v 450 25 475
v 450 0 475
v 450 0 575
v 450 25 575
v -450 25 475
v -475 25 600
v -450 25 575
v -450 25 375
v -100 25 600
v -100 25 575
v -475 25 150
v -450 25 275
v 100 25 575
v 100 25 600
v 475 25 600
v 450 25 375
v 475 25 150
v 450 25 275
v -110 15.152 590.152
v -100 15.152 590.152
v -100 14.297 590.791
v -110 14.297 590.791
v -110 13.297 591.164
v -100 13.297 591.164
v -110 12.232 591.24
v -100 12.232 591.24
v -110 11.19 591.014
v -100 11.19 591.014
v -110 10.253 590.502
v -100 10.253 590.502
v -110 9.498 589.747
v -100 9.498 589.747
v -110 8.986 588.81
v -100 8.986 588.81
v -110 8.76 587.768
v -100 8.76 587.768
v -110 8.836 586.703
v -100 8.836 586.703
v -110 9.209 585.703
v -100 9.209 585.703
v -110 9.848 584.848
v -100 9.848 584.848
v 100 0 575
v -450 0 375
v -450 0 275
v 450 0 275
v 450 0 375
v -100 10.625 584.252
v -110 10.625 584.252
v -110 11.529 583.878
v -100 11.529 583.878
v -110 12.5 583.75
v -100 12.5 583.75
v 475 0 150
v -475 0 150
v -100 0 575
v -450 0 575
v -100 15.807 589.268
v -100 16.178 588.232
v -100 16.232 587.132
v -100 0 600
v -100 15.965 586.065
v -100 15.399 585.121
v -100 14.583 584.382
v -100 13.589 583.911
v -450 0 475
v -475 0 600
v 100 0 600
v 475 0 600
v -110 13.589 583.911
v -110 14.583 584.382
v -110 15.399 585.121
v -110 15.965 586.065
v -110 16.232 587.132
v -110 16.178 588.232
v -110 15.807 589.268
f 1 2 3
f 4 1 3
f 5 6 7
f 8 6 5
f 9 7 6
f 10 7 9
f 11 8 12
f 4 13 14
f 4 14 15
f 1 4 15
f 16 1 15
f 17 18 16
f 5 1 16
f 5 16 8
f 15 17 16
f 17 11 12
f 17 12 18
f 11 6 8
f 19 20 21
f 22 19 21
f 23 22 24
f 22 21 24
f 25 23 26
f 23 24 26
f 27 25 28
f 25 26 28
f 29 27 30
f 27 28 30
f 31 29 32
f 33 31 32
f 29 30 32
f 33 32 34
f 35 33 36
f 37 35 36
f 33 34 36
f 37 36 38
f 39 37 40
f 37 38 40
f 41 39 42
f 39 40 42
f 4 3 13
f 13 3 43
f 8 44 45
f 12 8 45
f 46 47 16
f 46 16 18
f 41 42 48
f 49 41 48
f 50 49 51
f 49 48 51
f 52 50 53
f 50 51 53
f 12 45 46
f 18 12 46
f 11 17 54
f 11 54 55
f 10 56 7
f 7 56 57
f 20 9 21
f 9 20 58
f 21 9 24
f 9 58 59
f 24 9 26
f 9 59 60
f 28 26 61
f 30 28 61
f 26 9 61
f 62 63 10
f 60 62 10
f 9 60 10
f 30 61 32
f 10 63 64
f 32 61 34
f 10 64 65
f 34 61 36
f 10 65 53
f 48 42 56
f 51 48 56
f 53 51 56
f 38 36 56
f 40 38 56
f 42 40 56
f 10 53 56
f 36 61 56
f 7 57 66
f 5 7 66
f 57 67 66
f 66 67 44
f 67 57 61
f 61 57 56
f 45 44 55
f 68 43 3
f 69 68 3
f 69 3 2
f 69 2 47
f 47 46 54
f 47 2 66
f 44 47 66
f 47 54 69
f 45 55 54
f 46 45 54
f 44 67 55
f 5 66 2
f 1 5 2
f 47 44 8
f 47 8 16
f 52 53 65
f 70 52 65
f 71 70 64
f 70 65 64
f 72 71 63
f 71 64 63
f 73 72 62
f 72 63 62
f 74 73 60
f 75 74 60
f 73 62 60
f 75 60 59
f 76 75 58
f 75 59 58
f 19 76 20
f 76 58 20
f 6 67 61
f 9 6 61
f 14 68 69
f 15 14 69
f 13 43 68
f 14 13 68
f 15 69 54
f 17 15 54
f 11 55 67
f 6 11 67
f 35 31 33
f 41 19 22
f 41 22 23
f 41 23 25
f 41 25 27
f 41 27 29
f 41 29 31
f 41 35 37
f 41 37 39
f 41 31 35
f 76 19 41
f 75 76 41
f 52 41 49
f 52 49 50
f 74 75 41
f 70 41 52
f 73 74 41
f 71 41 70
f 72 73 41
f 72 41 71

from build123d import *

# Parameters (mm, degrees)
CROQUIS1_W              = 900
CROQUIS1_H              = 100
CROQUIS1_H_2            = 150
SALIENTE_EXTRUIR2_DEPTH = 25
CORTAR_EXTRUIR1_DEPTH   = 10
CROQUIS3_W              = 950
CROQUIS3_H              = 25
CORTAR_EXTRUIR2_DEPTH   = 750


with BuildPart() as part:
    # Croquis1 → Saliente-Extruir2 (new body)
    with BuildSketch(Plane(origin=(0, 0, 0), x_dir=(1, 0, 0), z_dir=(0, 1, 0))):
        Polygon((450, -475), (450, -575), (100, -575), (100, -600), (475, -600), (475, 600), (-475, 600), (-475, -600), (-100, -600), (-100, -575), (-450, -575), (-450, -475), align=None)
        with Locations((0, -325)):
            Rectangle(CROQUIS1_W, CROQUIS1_H, mode=Mode.SUBTRACT)
        with Locations((0, 50)):
            Rectangle(CROQUIS1_W, CROQUIS1_H_2, mode=Mode.SUBTRACT)
        with Locations((0, 350)):
            Rectangle(CROQUIS1_W, CROQUIS1_H_2, mode=Mode.SUBTRACT)
    extrude(amount=SALIENTE_EXTRUIR2_DEPTH)

    # Croquis2 → Cortar-Extruir1 (cut)
    with BuildSketch(Plane(origin=(-100, 0, 0), x_dir=(0, 0, -1), z_dir=(1, 0, 0))):
        with BuildLine():
            ThreePointArc((-583.75, 12.5), (-586.064937129, 15.964548247), (-590.151650429, 15.151650429))
            Line((-590.151650429, 15.151650429), (-584.848349571, 9.848349571))
            ThreePointArc((-584.848349571, 9.848349571), (-584.035451753, 11.064937129), (-583.75, 12.5))
        make_face()
        with BuildLine():
            Line((-584.848349571, 9.848349571), (-590.151650429, 15.151650429))
            ThreePointArc((-590.151650429, 15.151650429), (-590.151650429, 9.848349571), (-584.848349571, 9.848349571))
        make_face()
    extrude(amount=-CORTAR_EXTRUIR1_DEPTH, mode=Mode.SUBTRACT)

    # Croquis3 → Cortar-Extruir2 (cut)
    with BuildSketch(Plane(origin=(0, 0, -600), x_dir=(-1, 0, 0), z_dir=(0, 0, -1))):
        with Locations((0, 12.5)):
            Rectangle(CROQUIS3_W, CROQUIS3_H)
    extrude(amount=-CORTAR_EXTRUIR2_DEPTH, mode=Mode.SUBTRACT)


solid = part.part
